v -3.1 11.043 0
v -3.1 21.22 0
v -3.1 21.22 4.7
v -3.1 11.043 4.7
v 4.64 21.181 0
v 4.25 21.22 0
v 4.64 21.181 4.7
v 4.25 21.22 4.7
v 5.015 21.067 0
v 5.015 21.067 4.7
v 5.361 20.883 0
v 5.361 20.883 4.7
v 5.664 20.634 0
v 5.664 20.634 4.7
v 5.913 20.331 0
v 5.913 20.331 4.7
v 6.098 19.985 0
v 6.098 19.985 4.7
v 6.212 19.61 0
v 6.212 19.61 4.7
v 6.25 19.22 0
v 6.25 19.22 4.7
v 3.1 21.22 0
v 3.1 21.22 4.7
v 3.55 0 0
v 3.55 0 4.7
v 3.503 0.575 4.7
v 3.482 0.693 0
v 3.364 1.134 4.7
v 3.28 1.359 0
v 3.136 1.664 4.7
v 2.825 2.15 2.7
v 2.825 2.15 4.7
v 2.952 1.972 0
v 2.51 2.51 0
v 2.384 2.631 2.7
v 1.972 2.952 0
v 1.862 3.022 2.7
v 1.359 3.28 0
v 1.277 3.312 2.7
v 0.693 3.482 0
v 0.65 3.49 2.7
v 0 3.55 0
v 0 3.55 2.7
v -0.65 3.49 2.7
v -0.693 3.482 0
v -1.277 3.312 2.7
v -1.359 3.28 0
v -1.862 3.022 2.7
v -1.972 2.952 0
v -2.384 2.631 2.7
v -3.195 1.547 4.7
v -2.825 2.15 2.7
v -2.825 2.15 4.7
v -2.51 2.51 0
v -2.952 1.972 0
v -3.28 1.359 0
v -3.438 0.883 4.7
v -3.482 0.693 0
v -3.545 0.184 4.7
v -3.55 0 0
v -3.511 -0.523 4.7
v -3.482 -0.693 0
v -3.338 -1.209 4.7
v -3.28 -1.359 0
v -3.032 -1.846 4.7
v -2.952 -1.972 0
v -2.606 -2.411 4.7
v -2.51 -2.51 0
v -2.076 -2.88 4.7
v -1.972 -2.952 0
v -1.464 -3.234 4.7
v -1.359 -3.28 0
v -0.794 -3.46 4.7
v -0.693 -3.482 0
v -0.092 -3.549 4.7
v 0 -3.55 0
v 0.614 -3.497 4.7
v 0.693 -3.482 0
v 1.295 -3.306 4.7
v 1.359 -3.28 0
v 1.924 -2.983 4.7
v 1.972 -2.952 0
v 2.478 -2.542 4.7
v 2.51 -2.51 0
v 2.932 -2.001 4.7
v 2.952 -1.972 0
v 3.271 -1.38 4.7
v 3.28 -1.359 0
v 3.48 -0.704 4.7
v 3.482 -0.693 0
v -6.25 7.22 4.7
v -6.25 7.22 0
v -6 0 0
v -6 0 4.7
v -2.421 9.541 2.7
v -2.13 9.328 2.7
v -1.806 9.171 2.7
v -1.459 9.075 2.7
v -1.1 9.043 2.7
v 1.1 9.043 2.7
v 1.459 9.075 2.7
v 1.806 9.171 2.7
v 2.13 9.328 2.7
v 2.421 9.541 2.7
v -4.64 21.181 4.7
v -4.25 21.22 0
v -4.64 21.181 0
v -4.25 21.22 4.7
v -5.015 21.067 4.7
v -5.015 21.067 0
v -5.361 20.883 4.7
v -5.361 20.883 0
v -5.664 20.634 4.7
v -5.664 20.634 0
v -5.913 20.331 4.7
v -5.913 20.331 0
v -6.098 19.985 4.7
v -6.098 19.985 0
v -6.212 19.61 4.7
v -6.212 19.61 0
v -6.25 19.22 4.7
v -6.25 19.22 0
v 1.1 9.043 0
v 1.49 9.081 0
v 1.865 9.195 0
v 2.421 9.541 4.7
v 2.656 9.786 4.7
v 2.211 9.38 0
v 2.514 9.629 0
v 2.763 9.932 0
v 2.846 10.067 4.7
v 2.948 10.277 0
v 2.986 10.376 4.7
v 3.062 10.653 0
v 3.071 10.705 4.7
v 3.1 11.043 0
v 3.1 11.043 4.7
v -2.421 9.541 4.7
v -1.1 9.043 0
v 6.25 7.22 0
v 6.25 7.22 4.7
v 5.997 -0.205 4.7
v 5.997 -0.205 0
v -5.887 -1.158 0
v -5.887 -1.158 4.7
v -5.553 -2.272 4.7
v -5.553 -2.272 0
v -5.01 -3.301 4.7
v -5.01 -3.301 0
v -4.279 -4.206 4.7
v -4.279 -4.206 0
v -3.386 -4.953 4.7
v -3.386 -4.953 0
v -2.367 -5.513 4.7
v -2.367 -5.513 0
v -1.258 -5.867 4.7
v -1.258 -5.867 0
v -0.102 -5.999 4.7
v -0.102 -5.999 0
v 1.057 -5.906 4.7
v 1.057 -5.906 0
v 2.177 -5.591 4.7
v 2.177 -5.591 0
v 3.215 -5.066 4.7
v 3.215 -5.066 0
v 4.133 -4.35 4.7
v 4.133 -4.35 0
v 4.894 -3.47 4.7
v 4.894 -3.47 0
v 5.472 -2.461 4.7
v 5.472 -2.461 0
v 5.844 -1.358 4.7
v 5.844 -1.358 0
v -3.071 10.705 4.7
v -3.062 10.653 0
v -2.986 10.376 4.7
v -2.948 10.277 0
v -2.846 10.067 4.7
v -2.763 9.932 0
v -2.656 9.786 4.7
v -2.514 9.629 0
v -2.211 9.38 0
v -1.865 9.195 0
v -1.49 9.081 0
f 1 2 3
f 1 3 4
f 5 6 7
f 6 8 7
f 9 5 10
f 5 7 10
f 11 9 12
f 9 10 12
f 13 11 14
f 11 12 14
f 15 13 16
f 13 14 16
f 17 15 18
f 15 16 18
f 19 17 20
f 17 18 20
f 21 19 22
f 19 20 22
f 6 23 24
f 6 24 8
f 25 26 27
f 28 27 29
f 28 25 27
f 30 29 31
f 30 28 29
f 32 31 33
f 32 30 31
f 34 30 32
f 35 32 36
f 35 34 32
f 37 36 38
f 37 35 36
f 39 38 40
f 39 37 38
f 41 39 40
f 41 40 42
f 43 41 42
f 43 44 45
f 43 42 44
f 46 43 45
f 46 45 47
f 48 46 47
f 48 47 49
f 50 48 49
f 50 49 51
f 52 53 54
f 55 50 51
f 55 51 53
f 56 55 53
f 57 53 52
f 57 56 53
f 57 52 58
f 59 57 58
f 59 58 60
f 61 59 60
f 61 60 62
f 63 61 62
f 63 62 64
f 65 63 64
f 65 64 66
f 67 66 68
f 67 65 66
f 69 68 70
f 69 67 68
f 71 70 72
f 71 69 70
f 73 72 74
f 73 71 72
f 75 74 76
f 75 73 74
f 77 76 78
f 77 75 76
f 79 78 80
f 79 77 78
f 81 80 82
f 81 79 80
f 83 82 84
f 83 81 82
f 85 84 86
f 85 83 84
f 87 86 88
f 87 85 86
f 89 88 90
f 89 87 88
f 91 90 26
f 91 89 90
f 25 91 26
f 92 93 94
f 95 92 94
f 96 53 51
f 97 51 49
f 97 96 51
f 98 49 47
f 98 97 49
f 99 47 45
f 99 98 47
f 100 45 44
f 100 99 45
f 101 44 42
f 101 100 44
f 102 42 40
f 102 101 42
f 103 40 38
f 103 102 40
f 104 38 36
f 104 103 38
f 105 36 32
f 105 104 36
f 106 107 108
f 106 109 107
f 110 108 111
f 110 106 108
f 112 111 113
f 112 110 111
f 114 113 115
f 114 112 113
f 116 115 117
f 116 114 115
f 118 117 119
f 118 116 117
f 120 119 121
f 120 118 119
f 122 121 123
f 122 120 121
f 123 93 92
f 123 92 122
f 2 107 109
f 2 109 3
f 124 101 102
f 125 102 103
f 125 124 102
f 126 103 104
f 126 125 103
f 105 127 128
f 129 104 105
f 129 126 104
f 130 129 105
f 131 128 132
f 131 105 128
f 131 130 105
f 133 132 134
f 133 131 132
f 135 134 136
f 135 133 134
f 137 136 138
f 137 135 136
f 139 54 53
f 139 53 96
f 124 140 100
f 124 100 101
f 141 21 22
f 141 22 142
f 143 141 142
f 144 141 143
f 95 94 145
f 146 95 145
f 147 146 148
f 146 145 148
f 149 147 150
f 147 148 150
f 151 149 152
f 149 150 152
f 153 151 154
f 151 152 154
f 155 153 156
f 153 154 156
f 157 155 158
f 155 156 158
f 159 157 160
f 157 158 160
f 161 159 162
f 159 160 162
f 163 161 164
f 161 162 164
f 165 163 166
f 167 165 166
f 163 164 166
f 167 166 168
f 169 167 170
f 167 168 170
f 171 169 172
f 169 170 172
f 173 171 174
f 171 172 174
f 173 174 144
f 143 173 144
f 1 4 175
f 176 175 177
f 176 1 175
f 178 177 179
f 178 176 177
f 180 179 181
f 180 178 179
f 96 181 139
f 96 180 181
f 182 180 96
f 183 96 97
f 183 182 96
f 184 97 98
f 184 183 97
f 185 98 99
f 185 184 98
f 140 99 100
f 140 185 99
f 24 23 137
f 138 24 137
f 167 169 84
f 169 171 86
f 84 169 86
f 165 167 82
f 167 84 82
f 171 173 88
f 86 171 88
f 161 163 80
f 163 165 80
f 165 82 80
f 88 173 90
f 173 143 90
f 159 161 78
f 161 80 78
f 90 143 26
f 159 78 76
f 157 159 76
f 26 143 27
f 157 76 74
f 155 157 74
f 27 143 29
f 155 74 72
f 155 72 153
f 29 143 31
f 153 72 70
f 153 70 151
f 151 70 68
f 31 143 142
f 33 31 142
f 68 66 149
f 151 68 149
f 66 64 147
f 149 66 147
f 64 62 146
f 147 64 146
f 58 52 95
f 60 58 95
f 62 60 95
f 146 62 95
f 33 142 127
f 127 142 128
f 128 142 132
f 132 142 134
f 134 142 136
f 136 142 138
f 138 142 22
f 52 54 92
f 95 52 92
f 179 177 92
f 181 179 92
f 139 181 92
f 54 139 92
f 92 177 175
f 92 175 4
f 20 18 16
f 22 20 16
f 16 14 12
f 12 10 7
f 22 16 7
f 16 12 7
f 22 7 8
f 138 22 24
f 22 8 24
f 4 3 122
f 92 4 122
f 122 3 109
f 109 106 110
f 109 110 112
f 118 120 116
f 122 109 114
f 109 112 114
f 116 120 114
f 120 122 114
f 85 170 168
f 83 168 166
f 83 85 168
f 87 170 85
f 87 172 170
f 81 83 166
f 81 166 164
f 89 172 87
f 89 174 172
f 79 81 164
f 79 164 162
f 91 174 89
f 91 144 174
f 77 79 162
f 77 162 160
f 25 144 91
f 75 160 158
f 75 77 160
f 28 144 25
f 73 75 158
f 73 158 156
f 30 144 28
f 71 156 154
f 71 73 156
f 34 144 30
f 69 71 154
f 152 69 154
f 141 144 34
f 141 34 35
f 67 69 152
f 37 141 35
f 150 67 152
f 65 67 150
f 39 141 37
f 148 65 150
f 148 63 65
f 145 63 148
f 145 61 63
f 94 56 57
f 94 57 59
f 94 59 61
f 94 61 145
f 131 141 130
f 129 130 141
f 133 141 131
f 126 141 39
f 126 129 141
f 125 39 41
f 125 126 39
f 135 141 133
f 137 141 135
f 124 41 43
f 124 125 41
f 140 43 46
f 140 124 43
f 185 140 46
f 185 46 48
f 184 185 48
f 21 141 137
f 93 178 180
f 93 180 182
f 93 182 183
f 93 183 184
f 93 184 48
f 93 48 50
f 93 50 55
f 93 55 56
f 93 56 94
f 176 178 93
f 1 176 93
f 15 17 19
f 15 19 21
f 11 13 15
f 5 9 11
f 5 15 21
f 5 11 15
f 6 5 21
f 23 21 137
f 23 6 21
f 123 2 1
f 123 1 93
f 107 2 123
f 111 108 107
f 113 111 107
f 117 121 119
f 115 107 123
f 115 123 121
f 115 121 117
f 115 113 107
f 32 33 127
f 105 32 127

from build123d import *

# Parameters (mm, degrees)
SKETCH014_R      = 3.55
EXTRUDE004_DEPTH = 4.7
POCKET_DEPTH     = 2
FILLET006_R      = 2


with BuildPart() as part:
    # Sketch014 → Extrude004 (new body)
    with BuildSketch(Plane.XY):
        with BuildLine():
            Line((-6.25, 21.219667), (-3.1, 21.219667))
            Line((-3.1, 21.219667), (-3.1, 11.042747))
            ThreePointArc((-3.1, 11.042747), (-2.514214, 9.628534), (-1.1, 9.042747))
            Line((-1.1, 9.042747), (1.1, 9.042747))
            ThreePointArc((1.1, 9.042747), (2.514214, 9.628534), (3.1, 11.042747))
            Line((3.1, 21.219667), (3.1, 11.042747))
            Line((3.1, 21.219667), (6.25, 21.219667))
            Line((6.25, 21.219667), (6.25, 7.219667))
            Line((6.25, 7.219667), (5.996507, -0.204713))
            ThreePointArc((-6, 0), (-0.102371, -5.999127), (5.996507, -0.204713))
            Line((-6.25, 7.219635), (-6, 0))
            Line((-6.25, 7.219635), (-6.25, 21.219667))
        make_face()
        Circle(SKETCH014_R, mode=Mode.SUBTRACT)
    extrude(amount=EXTRUDE004_DEPTH)

    # Sketch015 (on Face15 of Extrude004) → Pocket (cut)
    with BuildSketch(Plane.XY.offset(4.7)):
        with BuildLine():
            ThreePointArc((-2.825, 2.149855), (0, -3.55), (2.825, 2.149855))
            Line((2.825, 2.149855), (2.4, 9.919679))
            Line((-2.4, 9.919679), (2.4, 9.919679))
            Line((-2.825, 2.149855), (-2.4, 9.919679))
        make_face()
    extrude(amount=-POCKET_DEPTH, mode=Mode.SUBTRACT)

    # Fillet006
    fillet006_edges = [part.edges().sort_by_distance(p)[0] for p in [
        (6.25, 21.219667, 2.35),
        (-6.25, 21.219667, 2.35),
    ]]
    fillet(fillet006_edges, radius=FILLET006_R)


solid = part.part
